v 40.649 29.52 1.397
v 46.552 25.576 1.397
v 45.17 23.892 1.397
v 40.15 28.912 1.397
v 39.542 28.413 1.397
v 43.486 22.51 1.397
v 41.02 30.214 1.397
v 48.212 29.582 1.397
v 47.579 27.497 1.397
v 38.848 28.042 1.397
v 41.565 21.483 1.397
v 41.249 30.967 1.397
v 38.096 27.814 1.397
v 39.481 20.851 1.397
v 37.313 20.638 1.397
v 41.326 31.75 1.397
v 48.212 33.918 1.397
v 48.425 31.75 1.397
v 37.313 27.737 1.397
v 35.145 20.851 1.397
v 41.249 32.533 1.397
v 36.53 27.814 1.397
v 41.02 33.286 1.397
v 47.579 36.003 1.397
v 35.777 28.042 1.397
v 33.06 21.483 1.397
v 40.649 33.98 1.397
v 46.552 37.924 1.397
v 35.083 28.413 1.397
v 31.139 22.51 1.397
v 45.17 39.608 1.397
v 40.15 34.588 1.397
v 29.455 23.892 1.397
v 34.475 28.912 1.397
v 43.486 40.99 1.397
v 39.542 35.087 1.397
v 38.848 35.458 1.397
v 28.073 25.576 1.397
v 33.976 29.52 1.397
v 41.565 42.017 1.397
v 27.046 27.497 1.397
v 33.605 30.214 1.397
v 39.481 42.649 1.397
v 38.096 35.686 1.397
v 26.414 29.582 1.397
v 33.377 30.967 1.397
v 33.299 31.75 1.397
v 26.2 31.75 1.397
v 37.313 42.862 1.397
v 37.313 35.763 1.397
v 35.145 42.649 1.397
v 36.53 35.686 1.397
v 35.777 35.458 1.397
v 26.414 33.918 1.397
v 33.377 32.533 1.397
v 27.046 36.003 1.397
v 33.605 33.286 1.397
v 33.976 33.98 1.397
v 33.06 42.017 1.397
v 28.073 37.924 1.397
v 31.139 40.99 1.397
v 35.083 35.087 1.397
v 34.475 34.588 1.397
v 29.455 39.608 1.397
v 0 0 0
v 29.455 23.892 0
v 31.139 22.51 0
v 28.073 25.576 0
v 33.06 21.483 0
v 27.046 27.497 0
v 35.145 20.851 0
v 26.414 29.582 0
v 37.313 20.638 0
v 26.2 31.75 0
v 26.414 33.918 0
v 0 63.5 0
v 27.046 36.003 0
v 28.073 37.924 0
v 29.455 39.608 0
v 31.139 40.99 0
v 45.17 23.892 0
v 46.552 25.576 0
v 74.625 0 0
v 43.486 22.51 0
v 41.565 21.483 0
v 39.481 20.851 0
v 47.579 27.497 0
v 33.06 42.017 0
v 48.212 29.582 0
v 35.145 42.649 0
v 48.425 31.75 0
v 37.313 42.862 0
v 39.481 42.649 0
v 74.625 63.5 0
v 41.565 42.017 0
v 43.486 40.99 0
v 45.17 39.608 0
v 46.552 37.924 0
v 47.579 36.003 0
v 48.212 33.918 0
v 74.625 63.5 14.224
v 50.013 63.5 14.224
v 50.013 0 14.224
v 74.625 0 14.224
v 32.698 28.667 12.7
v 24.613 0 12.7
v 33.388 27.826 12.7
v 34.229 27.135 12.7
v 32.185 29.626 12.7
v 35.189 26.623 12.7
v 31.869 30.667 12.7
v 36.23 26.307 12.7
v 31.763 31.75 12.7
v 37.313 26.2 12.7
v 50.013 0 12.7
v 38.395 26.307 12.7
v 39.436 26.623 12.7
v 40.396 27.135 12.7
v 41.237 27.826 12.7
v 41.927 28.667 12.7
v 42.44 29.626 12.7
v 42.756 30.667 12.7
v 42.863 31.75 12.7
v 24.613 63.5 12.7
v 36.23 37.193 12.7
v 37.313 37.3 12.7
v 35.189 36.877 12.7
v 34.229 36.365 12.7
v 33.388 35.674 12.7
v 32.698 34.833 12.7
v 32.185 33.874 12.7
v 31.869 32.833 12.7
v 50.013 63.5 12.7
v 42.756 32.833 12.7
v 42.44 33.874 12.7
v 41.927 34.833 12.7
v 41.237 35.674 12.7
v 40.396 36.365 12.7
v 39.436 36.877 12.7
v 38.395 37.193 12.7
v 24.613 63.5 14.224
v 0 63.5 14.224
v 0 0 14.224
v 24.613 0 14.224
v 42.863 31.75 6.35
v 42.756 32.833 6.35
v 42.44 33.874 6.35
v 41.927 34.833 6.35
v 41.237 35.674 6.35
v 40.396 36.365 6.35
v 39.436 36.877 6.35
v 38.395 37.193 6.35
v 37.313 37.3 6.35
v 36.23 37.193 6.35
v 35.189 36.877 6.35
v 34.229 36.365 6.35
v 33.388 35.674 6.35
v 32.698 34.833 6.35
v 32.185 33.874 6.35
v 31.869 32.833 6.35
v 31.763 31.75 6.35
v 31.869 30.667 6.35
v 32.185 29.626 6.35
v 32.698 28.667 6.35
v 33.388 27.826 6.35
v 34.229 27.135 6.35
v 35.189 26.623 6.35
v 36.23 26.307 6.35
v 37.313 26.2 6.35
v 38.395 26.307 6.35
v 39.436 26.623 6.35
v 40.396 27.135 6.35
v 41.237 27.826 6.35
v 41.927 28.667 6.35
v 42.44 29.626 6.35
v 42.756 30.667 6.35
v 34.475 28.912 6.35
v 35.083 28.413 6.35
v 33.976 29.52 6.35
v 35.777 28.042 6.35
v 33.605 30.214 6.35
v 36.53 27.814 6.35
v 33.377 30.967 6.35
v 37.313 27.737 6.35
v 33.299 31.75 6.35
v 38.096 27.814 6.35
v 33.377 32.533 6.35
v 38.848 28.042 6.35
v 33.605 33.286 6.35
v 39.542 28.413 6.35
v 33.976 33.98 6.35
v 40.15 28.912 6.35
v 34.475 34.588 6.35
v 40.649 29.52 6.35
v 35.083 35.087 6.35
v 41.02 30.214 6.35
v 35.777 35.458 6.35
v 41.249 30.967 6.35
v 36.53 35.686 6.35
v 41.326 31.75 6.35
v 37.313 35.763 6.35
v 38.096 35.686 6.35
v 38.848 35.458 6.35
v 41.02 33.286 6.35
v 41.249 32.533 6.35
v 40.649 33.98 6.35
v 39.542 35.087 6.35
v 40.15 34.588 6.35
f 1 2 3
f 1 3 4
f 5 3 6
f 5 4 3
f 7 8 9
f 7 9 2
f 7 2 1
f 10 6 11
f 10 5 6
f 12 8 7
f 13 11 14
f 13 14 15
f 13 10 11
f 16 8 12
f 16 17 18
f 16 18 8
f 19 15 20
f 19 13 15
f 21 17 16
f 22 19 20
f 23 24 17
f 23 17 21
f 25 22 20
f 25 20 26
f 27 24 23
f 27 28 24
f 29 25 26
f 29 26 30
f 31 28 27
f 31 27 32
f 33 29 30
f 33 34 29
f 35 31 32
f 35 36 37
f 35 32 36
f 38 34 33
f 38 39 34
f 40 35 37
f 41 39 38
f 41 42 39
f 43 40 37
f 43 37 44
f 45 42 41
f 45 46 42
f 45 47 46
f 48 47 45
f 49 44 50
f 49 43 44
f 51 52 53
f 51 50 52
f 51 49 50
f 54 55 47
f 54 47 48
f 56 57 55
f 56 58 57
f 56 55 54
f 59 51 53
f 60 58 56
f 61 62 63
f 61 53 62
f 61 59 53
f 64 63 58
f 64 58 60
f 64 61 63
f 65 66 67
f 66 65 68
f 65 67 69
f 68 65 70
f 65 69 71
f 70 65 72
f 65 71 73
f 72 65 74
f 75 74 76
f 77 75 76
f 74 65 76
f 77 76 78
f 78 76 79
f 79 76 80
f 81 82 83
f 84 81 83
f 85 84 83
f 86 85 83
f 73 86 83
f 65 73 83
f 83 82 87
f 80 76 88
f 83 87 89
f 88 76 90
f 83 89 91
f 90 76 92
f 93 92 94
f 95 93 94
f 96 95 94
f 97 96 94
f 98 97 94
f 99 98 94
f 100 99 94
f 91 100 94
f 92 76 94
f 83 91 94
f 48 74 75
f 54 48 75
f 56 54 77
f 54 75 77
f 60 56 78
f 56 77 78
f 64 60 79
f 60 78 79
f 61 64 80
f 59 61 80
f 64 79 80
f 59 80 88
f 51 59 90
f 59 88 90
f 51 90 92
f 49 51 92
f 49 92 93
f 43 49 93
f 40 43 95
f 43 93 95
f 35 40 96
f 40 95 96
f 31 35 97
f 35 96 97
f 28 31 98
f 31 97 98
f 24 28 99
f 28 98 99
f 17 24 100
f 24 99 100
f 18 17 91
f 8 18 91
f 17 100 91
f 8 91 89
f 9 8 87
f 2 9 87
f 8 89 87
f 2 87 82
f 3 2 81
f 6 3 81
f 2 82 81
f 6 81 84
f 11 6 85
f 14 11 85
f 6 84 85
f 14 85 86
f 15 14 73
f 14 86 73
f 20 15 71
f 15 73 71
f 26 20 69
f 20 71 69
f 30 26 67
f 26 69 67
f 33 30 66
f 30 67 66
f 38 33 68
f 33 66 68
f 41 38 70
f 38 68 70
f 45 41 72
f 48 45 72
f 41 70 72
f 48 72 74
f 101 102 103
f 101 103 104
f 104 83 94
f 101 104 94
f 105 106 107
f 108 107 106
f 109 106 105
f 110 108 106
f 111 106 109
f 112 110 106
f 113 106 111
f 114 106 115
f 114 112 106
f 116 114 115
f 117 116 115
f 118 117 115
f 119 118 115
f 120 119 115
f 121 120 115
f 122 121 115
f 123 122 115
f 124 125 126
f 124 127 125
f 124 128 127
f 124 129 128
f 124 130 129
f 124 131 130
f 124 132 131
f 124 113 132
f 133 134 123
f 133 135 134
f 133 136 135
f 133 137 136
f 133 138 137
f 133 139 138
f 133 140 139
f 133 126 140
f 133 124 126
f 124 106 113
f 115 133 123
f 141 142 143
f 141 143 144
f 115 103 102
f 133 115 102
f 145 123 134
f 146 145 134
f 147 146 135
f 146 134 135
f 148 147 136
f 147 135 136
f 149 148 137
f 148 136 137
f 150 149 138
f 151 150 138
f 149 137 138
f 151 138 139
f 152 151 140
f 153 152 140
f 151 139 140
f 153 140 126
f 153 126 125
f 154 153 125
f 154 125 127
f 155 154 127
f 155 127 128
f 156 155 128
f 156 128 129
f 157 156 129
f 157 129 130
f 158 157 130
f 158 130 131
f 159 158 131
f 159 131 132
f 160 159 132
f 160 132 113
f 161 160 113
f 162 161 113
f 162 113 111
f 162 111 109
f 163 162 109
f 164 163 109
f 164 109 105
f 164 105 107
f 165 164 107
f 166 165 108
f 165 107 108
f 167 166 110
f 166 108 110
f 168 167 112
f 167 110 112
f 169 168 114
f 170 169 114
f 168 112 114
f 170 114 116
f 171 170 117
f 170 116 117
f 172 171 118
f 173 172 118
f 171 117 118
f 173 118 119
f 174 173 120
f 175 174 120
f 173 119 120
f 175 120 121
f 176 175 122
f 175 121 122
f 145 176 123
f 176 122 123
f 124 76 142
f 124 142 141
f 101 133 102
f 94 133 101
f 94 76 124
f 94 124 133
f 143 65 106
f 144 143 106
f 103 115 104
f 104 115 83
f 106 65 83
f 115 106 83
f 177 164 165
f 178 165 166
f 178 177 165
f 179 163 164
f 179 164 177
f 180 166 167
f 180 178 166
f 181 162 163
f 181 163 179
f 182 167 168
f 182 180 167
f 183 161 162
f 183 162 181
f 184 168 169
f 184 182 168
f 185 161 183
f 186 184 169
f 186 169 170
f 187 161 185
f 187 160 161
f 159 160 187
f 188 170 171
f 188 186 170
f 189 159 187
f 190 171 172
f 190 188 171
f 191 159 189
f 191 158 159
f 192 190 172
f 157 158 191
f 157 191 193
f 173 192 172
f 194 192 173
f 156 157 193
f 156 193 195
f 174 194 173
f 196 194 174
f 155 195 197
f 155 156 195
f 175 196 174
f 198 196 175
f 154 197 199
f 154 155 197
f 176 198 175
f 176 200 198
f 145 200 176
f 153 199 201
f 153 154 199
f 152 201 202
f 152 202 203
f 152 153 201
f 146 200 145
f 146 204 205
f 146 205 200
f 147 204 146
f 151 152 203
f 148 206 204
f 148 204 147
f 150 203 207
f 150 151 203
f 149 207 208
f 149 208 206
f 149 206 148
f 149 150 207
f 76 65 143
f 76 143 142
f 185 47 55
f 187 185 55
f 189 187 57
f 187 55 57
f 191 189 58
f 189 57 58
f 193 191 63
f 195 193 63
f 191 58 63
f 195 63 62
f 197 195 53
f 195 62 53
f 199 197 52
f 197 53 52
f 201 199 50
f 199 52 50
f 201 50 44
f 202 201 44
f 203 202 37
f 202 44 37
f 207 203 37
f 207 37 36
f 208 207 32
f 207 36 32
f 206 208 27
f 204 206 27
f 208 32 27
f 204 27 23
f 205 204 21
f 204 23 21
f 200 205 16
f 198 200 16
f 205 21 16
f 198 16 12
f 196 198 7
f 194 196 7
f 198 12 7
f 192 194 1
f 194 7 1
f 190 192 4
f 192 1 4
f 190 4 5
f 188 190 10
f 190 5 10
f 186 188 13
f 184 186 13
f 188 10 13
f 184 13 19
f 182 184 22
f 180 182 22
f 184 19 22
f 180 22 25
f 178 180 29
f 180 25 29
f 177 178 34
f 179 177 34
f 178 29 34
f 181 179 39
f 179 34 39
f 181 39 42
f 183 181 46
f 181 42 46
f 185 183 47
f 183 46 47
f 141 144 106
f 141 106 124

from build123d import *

# Parameters (mm, degrees)
SKETCH1_W                                        = 74.6252
SKETCH1_H                                        = 63.5
BOSS_EXTRUDE1_DEPTH                              = 14.224
CBORE_FOR_1_4_SOCKET_HEAD_CAP_SCREW1_D           = 8.0264
CBORE_FOR_1_4_SOCKET_HEAD_CAP_SCREW1_CBORE_D     = 11.0998
CBORE_FOR_1_4_SOCKET_HEAD_CAP_SCREW1_CBORE_DEPTH = 7.874
SKETCH9_W                                        = 25.4
SKETCH9_H                                        = 63.5
CUT_EXTRUDE1_DEPTH                               = 1.524
SKETCH10_R                                       = 11.1125
CUT_EXTRUDE2_DEPTH                               = 1.397


with BuildPart() as part:
    # Sketch1 → Boss-Extrude1 (new body)
    with BuildSketch(Plane.XY):
        with Locations((37.3126, 31.75)):
            Rectangle(SKETCH1_W, SKETCH1_H)
    extrude(amount=BOSS_EXTRUDE1_DEPTH)

    # CBORE for 1/4 Socket Head Cap Screw1 (through all)
    with Locations(Plane.XY.offset(14.224)):
        with Locations((37.3126, 31.75)):
            CounterBoreHole(CBORE_FOR_1_4_SOCKET_HEAD_CAP_SCREW1_D / 2, CBORE_FOR_1_4_SOCKET_HEAD_CAP_SCREW1_CBORE_D / 2, CBORE_FOR_1_4_SOCKET_HEAD_CAP_SCREW1_CBORE_DEPTH)

    # Sketch9 → Cut-Extrude1 (cut)
    with BuildSketch(Plane.XY.offset(14.224)):
        with Locations((37.3126, 31.75)):
            Rectangle(SKETCH9_W, SKETCH9_H)
    extrude(amount=-CUT_EXTRUDE1_DEPTH, mode=Mode.SUBTRACT)

    # Sketch10 → Cut-Extrude2 (cut)
    with BuildSketch(Plane(origin=(0, 0, 0), x_dir=(-1, 0, 0), z_dir=(0, 0, -1))):
        with Locations((-37.3126, 31.75)):
            Circle(SKETCH10_R)
    extrude(amount=-CUT_EXTRUDE2_DEPTH, mode=Mode.SUBTRACT)


solid = part.part
